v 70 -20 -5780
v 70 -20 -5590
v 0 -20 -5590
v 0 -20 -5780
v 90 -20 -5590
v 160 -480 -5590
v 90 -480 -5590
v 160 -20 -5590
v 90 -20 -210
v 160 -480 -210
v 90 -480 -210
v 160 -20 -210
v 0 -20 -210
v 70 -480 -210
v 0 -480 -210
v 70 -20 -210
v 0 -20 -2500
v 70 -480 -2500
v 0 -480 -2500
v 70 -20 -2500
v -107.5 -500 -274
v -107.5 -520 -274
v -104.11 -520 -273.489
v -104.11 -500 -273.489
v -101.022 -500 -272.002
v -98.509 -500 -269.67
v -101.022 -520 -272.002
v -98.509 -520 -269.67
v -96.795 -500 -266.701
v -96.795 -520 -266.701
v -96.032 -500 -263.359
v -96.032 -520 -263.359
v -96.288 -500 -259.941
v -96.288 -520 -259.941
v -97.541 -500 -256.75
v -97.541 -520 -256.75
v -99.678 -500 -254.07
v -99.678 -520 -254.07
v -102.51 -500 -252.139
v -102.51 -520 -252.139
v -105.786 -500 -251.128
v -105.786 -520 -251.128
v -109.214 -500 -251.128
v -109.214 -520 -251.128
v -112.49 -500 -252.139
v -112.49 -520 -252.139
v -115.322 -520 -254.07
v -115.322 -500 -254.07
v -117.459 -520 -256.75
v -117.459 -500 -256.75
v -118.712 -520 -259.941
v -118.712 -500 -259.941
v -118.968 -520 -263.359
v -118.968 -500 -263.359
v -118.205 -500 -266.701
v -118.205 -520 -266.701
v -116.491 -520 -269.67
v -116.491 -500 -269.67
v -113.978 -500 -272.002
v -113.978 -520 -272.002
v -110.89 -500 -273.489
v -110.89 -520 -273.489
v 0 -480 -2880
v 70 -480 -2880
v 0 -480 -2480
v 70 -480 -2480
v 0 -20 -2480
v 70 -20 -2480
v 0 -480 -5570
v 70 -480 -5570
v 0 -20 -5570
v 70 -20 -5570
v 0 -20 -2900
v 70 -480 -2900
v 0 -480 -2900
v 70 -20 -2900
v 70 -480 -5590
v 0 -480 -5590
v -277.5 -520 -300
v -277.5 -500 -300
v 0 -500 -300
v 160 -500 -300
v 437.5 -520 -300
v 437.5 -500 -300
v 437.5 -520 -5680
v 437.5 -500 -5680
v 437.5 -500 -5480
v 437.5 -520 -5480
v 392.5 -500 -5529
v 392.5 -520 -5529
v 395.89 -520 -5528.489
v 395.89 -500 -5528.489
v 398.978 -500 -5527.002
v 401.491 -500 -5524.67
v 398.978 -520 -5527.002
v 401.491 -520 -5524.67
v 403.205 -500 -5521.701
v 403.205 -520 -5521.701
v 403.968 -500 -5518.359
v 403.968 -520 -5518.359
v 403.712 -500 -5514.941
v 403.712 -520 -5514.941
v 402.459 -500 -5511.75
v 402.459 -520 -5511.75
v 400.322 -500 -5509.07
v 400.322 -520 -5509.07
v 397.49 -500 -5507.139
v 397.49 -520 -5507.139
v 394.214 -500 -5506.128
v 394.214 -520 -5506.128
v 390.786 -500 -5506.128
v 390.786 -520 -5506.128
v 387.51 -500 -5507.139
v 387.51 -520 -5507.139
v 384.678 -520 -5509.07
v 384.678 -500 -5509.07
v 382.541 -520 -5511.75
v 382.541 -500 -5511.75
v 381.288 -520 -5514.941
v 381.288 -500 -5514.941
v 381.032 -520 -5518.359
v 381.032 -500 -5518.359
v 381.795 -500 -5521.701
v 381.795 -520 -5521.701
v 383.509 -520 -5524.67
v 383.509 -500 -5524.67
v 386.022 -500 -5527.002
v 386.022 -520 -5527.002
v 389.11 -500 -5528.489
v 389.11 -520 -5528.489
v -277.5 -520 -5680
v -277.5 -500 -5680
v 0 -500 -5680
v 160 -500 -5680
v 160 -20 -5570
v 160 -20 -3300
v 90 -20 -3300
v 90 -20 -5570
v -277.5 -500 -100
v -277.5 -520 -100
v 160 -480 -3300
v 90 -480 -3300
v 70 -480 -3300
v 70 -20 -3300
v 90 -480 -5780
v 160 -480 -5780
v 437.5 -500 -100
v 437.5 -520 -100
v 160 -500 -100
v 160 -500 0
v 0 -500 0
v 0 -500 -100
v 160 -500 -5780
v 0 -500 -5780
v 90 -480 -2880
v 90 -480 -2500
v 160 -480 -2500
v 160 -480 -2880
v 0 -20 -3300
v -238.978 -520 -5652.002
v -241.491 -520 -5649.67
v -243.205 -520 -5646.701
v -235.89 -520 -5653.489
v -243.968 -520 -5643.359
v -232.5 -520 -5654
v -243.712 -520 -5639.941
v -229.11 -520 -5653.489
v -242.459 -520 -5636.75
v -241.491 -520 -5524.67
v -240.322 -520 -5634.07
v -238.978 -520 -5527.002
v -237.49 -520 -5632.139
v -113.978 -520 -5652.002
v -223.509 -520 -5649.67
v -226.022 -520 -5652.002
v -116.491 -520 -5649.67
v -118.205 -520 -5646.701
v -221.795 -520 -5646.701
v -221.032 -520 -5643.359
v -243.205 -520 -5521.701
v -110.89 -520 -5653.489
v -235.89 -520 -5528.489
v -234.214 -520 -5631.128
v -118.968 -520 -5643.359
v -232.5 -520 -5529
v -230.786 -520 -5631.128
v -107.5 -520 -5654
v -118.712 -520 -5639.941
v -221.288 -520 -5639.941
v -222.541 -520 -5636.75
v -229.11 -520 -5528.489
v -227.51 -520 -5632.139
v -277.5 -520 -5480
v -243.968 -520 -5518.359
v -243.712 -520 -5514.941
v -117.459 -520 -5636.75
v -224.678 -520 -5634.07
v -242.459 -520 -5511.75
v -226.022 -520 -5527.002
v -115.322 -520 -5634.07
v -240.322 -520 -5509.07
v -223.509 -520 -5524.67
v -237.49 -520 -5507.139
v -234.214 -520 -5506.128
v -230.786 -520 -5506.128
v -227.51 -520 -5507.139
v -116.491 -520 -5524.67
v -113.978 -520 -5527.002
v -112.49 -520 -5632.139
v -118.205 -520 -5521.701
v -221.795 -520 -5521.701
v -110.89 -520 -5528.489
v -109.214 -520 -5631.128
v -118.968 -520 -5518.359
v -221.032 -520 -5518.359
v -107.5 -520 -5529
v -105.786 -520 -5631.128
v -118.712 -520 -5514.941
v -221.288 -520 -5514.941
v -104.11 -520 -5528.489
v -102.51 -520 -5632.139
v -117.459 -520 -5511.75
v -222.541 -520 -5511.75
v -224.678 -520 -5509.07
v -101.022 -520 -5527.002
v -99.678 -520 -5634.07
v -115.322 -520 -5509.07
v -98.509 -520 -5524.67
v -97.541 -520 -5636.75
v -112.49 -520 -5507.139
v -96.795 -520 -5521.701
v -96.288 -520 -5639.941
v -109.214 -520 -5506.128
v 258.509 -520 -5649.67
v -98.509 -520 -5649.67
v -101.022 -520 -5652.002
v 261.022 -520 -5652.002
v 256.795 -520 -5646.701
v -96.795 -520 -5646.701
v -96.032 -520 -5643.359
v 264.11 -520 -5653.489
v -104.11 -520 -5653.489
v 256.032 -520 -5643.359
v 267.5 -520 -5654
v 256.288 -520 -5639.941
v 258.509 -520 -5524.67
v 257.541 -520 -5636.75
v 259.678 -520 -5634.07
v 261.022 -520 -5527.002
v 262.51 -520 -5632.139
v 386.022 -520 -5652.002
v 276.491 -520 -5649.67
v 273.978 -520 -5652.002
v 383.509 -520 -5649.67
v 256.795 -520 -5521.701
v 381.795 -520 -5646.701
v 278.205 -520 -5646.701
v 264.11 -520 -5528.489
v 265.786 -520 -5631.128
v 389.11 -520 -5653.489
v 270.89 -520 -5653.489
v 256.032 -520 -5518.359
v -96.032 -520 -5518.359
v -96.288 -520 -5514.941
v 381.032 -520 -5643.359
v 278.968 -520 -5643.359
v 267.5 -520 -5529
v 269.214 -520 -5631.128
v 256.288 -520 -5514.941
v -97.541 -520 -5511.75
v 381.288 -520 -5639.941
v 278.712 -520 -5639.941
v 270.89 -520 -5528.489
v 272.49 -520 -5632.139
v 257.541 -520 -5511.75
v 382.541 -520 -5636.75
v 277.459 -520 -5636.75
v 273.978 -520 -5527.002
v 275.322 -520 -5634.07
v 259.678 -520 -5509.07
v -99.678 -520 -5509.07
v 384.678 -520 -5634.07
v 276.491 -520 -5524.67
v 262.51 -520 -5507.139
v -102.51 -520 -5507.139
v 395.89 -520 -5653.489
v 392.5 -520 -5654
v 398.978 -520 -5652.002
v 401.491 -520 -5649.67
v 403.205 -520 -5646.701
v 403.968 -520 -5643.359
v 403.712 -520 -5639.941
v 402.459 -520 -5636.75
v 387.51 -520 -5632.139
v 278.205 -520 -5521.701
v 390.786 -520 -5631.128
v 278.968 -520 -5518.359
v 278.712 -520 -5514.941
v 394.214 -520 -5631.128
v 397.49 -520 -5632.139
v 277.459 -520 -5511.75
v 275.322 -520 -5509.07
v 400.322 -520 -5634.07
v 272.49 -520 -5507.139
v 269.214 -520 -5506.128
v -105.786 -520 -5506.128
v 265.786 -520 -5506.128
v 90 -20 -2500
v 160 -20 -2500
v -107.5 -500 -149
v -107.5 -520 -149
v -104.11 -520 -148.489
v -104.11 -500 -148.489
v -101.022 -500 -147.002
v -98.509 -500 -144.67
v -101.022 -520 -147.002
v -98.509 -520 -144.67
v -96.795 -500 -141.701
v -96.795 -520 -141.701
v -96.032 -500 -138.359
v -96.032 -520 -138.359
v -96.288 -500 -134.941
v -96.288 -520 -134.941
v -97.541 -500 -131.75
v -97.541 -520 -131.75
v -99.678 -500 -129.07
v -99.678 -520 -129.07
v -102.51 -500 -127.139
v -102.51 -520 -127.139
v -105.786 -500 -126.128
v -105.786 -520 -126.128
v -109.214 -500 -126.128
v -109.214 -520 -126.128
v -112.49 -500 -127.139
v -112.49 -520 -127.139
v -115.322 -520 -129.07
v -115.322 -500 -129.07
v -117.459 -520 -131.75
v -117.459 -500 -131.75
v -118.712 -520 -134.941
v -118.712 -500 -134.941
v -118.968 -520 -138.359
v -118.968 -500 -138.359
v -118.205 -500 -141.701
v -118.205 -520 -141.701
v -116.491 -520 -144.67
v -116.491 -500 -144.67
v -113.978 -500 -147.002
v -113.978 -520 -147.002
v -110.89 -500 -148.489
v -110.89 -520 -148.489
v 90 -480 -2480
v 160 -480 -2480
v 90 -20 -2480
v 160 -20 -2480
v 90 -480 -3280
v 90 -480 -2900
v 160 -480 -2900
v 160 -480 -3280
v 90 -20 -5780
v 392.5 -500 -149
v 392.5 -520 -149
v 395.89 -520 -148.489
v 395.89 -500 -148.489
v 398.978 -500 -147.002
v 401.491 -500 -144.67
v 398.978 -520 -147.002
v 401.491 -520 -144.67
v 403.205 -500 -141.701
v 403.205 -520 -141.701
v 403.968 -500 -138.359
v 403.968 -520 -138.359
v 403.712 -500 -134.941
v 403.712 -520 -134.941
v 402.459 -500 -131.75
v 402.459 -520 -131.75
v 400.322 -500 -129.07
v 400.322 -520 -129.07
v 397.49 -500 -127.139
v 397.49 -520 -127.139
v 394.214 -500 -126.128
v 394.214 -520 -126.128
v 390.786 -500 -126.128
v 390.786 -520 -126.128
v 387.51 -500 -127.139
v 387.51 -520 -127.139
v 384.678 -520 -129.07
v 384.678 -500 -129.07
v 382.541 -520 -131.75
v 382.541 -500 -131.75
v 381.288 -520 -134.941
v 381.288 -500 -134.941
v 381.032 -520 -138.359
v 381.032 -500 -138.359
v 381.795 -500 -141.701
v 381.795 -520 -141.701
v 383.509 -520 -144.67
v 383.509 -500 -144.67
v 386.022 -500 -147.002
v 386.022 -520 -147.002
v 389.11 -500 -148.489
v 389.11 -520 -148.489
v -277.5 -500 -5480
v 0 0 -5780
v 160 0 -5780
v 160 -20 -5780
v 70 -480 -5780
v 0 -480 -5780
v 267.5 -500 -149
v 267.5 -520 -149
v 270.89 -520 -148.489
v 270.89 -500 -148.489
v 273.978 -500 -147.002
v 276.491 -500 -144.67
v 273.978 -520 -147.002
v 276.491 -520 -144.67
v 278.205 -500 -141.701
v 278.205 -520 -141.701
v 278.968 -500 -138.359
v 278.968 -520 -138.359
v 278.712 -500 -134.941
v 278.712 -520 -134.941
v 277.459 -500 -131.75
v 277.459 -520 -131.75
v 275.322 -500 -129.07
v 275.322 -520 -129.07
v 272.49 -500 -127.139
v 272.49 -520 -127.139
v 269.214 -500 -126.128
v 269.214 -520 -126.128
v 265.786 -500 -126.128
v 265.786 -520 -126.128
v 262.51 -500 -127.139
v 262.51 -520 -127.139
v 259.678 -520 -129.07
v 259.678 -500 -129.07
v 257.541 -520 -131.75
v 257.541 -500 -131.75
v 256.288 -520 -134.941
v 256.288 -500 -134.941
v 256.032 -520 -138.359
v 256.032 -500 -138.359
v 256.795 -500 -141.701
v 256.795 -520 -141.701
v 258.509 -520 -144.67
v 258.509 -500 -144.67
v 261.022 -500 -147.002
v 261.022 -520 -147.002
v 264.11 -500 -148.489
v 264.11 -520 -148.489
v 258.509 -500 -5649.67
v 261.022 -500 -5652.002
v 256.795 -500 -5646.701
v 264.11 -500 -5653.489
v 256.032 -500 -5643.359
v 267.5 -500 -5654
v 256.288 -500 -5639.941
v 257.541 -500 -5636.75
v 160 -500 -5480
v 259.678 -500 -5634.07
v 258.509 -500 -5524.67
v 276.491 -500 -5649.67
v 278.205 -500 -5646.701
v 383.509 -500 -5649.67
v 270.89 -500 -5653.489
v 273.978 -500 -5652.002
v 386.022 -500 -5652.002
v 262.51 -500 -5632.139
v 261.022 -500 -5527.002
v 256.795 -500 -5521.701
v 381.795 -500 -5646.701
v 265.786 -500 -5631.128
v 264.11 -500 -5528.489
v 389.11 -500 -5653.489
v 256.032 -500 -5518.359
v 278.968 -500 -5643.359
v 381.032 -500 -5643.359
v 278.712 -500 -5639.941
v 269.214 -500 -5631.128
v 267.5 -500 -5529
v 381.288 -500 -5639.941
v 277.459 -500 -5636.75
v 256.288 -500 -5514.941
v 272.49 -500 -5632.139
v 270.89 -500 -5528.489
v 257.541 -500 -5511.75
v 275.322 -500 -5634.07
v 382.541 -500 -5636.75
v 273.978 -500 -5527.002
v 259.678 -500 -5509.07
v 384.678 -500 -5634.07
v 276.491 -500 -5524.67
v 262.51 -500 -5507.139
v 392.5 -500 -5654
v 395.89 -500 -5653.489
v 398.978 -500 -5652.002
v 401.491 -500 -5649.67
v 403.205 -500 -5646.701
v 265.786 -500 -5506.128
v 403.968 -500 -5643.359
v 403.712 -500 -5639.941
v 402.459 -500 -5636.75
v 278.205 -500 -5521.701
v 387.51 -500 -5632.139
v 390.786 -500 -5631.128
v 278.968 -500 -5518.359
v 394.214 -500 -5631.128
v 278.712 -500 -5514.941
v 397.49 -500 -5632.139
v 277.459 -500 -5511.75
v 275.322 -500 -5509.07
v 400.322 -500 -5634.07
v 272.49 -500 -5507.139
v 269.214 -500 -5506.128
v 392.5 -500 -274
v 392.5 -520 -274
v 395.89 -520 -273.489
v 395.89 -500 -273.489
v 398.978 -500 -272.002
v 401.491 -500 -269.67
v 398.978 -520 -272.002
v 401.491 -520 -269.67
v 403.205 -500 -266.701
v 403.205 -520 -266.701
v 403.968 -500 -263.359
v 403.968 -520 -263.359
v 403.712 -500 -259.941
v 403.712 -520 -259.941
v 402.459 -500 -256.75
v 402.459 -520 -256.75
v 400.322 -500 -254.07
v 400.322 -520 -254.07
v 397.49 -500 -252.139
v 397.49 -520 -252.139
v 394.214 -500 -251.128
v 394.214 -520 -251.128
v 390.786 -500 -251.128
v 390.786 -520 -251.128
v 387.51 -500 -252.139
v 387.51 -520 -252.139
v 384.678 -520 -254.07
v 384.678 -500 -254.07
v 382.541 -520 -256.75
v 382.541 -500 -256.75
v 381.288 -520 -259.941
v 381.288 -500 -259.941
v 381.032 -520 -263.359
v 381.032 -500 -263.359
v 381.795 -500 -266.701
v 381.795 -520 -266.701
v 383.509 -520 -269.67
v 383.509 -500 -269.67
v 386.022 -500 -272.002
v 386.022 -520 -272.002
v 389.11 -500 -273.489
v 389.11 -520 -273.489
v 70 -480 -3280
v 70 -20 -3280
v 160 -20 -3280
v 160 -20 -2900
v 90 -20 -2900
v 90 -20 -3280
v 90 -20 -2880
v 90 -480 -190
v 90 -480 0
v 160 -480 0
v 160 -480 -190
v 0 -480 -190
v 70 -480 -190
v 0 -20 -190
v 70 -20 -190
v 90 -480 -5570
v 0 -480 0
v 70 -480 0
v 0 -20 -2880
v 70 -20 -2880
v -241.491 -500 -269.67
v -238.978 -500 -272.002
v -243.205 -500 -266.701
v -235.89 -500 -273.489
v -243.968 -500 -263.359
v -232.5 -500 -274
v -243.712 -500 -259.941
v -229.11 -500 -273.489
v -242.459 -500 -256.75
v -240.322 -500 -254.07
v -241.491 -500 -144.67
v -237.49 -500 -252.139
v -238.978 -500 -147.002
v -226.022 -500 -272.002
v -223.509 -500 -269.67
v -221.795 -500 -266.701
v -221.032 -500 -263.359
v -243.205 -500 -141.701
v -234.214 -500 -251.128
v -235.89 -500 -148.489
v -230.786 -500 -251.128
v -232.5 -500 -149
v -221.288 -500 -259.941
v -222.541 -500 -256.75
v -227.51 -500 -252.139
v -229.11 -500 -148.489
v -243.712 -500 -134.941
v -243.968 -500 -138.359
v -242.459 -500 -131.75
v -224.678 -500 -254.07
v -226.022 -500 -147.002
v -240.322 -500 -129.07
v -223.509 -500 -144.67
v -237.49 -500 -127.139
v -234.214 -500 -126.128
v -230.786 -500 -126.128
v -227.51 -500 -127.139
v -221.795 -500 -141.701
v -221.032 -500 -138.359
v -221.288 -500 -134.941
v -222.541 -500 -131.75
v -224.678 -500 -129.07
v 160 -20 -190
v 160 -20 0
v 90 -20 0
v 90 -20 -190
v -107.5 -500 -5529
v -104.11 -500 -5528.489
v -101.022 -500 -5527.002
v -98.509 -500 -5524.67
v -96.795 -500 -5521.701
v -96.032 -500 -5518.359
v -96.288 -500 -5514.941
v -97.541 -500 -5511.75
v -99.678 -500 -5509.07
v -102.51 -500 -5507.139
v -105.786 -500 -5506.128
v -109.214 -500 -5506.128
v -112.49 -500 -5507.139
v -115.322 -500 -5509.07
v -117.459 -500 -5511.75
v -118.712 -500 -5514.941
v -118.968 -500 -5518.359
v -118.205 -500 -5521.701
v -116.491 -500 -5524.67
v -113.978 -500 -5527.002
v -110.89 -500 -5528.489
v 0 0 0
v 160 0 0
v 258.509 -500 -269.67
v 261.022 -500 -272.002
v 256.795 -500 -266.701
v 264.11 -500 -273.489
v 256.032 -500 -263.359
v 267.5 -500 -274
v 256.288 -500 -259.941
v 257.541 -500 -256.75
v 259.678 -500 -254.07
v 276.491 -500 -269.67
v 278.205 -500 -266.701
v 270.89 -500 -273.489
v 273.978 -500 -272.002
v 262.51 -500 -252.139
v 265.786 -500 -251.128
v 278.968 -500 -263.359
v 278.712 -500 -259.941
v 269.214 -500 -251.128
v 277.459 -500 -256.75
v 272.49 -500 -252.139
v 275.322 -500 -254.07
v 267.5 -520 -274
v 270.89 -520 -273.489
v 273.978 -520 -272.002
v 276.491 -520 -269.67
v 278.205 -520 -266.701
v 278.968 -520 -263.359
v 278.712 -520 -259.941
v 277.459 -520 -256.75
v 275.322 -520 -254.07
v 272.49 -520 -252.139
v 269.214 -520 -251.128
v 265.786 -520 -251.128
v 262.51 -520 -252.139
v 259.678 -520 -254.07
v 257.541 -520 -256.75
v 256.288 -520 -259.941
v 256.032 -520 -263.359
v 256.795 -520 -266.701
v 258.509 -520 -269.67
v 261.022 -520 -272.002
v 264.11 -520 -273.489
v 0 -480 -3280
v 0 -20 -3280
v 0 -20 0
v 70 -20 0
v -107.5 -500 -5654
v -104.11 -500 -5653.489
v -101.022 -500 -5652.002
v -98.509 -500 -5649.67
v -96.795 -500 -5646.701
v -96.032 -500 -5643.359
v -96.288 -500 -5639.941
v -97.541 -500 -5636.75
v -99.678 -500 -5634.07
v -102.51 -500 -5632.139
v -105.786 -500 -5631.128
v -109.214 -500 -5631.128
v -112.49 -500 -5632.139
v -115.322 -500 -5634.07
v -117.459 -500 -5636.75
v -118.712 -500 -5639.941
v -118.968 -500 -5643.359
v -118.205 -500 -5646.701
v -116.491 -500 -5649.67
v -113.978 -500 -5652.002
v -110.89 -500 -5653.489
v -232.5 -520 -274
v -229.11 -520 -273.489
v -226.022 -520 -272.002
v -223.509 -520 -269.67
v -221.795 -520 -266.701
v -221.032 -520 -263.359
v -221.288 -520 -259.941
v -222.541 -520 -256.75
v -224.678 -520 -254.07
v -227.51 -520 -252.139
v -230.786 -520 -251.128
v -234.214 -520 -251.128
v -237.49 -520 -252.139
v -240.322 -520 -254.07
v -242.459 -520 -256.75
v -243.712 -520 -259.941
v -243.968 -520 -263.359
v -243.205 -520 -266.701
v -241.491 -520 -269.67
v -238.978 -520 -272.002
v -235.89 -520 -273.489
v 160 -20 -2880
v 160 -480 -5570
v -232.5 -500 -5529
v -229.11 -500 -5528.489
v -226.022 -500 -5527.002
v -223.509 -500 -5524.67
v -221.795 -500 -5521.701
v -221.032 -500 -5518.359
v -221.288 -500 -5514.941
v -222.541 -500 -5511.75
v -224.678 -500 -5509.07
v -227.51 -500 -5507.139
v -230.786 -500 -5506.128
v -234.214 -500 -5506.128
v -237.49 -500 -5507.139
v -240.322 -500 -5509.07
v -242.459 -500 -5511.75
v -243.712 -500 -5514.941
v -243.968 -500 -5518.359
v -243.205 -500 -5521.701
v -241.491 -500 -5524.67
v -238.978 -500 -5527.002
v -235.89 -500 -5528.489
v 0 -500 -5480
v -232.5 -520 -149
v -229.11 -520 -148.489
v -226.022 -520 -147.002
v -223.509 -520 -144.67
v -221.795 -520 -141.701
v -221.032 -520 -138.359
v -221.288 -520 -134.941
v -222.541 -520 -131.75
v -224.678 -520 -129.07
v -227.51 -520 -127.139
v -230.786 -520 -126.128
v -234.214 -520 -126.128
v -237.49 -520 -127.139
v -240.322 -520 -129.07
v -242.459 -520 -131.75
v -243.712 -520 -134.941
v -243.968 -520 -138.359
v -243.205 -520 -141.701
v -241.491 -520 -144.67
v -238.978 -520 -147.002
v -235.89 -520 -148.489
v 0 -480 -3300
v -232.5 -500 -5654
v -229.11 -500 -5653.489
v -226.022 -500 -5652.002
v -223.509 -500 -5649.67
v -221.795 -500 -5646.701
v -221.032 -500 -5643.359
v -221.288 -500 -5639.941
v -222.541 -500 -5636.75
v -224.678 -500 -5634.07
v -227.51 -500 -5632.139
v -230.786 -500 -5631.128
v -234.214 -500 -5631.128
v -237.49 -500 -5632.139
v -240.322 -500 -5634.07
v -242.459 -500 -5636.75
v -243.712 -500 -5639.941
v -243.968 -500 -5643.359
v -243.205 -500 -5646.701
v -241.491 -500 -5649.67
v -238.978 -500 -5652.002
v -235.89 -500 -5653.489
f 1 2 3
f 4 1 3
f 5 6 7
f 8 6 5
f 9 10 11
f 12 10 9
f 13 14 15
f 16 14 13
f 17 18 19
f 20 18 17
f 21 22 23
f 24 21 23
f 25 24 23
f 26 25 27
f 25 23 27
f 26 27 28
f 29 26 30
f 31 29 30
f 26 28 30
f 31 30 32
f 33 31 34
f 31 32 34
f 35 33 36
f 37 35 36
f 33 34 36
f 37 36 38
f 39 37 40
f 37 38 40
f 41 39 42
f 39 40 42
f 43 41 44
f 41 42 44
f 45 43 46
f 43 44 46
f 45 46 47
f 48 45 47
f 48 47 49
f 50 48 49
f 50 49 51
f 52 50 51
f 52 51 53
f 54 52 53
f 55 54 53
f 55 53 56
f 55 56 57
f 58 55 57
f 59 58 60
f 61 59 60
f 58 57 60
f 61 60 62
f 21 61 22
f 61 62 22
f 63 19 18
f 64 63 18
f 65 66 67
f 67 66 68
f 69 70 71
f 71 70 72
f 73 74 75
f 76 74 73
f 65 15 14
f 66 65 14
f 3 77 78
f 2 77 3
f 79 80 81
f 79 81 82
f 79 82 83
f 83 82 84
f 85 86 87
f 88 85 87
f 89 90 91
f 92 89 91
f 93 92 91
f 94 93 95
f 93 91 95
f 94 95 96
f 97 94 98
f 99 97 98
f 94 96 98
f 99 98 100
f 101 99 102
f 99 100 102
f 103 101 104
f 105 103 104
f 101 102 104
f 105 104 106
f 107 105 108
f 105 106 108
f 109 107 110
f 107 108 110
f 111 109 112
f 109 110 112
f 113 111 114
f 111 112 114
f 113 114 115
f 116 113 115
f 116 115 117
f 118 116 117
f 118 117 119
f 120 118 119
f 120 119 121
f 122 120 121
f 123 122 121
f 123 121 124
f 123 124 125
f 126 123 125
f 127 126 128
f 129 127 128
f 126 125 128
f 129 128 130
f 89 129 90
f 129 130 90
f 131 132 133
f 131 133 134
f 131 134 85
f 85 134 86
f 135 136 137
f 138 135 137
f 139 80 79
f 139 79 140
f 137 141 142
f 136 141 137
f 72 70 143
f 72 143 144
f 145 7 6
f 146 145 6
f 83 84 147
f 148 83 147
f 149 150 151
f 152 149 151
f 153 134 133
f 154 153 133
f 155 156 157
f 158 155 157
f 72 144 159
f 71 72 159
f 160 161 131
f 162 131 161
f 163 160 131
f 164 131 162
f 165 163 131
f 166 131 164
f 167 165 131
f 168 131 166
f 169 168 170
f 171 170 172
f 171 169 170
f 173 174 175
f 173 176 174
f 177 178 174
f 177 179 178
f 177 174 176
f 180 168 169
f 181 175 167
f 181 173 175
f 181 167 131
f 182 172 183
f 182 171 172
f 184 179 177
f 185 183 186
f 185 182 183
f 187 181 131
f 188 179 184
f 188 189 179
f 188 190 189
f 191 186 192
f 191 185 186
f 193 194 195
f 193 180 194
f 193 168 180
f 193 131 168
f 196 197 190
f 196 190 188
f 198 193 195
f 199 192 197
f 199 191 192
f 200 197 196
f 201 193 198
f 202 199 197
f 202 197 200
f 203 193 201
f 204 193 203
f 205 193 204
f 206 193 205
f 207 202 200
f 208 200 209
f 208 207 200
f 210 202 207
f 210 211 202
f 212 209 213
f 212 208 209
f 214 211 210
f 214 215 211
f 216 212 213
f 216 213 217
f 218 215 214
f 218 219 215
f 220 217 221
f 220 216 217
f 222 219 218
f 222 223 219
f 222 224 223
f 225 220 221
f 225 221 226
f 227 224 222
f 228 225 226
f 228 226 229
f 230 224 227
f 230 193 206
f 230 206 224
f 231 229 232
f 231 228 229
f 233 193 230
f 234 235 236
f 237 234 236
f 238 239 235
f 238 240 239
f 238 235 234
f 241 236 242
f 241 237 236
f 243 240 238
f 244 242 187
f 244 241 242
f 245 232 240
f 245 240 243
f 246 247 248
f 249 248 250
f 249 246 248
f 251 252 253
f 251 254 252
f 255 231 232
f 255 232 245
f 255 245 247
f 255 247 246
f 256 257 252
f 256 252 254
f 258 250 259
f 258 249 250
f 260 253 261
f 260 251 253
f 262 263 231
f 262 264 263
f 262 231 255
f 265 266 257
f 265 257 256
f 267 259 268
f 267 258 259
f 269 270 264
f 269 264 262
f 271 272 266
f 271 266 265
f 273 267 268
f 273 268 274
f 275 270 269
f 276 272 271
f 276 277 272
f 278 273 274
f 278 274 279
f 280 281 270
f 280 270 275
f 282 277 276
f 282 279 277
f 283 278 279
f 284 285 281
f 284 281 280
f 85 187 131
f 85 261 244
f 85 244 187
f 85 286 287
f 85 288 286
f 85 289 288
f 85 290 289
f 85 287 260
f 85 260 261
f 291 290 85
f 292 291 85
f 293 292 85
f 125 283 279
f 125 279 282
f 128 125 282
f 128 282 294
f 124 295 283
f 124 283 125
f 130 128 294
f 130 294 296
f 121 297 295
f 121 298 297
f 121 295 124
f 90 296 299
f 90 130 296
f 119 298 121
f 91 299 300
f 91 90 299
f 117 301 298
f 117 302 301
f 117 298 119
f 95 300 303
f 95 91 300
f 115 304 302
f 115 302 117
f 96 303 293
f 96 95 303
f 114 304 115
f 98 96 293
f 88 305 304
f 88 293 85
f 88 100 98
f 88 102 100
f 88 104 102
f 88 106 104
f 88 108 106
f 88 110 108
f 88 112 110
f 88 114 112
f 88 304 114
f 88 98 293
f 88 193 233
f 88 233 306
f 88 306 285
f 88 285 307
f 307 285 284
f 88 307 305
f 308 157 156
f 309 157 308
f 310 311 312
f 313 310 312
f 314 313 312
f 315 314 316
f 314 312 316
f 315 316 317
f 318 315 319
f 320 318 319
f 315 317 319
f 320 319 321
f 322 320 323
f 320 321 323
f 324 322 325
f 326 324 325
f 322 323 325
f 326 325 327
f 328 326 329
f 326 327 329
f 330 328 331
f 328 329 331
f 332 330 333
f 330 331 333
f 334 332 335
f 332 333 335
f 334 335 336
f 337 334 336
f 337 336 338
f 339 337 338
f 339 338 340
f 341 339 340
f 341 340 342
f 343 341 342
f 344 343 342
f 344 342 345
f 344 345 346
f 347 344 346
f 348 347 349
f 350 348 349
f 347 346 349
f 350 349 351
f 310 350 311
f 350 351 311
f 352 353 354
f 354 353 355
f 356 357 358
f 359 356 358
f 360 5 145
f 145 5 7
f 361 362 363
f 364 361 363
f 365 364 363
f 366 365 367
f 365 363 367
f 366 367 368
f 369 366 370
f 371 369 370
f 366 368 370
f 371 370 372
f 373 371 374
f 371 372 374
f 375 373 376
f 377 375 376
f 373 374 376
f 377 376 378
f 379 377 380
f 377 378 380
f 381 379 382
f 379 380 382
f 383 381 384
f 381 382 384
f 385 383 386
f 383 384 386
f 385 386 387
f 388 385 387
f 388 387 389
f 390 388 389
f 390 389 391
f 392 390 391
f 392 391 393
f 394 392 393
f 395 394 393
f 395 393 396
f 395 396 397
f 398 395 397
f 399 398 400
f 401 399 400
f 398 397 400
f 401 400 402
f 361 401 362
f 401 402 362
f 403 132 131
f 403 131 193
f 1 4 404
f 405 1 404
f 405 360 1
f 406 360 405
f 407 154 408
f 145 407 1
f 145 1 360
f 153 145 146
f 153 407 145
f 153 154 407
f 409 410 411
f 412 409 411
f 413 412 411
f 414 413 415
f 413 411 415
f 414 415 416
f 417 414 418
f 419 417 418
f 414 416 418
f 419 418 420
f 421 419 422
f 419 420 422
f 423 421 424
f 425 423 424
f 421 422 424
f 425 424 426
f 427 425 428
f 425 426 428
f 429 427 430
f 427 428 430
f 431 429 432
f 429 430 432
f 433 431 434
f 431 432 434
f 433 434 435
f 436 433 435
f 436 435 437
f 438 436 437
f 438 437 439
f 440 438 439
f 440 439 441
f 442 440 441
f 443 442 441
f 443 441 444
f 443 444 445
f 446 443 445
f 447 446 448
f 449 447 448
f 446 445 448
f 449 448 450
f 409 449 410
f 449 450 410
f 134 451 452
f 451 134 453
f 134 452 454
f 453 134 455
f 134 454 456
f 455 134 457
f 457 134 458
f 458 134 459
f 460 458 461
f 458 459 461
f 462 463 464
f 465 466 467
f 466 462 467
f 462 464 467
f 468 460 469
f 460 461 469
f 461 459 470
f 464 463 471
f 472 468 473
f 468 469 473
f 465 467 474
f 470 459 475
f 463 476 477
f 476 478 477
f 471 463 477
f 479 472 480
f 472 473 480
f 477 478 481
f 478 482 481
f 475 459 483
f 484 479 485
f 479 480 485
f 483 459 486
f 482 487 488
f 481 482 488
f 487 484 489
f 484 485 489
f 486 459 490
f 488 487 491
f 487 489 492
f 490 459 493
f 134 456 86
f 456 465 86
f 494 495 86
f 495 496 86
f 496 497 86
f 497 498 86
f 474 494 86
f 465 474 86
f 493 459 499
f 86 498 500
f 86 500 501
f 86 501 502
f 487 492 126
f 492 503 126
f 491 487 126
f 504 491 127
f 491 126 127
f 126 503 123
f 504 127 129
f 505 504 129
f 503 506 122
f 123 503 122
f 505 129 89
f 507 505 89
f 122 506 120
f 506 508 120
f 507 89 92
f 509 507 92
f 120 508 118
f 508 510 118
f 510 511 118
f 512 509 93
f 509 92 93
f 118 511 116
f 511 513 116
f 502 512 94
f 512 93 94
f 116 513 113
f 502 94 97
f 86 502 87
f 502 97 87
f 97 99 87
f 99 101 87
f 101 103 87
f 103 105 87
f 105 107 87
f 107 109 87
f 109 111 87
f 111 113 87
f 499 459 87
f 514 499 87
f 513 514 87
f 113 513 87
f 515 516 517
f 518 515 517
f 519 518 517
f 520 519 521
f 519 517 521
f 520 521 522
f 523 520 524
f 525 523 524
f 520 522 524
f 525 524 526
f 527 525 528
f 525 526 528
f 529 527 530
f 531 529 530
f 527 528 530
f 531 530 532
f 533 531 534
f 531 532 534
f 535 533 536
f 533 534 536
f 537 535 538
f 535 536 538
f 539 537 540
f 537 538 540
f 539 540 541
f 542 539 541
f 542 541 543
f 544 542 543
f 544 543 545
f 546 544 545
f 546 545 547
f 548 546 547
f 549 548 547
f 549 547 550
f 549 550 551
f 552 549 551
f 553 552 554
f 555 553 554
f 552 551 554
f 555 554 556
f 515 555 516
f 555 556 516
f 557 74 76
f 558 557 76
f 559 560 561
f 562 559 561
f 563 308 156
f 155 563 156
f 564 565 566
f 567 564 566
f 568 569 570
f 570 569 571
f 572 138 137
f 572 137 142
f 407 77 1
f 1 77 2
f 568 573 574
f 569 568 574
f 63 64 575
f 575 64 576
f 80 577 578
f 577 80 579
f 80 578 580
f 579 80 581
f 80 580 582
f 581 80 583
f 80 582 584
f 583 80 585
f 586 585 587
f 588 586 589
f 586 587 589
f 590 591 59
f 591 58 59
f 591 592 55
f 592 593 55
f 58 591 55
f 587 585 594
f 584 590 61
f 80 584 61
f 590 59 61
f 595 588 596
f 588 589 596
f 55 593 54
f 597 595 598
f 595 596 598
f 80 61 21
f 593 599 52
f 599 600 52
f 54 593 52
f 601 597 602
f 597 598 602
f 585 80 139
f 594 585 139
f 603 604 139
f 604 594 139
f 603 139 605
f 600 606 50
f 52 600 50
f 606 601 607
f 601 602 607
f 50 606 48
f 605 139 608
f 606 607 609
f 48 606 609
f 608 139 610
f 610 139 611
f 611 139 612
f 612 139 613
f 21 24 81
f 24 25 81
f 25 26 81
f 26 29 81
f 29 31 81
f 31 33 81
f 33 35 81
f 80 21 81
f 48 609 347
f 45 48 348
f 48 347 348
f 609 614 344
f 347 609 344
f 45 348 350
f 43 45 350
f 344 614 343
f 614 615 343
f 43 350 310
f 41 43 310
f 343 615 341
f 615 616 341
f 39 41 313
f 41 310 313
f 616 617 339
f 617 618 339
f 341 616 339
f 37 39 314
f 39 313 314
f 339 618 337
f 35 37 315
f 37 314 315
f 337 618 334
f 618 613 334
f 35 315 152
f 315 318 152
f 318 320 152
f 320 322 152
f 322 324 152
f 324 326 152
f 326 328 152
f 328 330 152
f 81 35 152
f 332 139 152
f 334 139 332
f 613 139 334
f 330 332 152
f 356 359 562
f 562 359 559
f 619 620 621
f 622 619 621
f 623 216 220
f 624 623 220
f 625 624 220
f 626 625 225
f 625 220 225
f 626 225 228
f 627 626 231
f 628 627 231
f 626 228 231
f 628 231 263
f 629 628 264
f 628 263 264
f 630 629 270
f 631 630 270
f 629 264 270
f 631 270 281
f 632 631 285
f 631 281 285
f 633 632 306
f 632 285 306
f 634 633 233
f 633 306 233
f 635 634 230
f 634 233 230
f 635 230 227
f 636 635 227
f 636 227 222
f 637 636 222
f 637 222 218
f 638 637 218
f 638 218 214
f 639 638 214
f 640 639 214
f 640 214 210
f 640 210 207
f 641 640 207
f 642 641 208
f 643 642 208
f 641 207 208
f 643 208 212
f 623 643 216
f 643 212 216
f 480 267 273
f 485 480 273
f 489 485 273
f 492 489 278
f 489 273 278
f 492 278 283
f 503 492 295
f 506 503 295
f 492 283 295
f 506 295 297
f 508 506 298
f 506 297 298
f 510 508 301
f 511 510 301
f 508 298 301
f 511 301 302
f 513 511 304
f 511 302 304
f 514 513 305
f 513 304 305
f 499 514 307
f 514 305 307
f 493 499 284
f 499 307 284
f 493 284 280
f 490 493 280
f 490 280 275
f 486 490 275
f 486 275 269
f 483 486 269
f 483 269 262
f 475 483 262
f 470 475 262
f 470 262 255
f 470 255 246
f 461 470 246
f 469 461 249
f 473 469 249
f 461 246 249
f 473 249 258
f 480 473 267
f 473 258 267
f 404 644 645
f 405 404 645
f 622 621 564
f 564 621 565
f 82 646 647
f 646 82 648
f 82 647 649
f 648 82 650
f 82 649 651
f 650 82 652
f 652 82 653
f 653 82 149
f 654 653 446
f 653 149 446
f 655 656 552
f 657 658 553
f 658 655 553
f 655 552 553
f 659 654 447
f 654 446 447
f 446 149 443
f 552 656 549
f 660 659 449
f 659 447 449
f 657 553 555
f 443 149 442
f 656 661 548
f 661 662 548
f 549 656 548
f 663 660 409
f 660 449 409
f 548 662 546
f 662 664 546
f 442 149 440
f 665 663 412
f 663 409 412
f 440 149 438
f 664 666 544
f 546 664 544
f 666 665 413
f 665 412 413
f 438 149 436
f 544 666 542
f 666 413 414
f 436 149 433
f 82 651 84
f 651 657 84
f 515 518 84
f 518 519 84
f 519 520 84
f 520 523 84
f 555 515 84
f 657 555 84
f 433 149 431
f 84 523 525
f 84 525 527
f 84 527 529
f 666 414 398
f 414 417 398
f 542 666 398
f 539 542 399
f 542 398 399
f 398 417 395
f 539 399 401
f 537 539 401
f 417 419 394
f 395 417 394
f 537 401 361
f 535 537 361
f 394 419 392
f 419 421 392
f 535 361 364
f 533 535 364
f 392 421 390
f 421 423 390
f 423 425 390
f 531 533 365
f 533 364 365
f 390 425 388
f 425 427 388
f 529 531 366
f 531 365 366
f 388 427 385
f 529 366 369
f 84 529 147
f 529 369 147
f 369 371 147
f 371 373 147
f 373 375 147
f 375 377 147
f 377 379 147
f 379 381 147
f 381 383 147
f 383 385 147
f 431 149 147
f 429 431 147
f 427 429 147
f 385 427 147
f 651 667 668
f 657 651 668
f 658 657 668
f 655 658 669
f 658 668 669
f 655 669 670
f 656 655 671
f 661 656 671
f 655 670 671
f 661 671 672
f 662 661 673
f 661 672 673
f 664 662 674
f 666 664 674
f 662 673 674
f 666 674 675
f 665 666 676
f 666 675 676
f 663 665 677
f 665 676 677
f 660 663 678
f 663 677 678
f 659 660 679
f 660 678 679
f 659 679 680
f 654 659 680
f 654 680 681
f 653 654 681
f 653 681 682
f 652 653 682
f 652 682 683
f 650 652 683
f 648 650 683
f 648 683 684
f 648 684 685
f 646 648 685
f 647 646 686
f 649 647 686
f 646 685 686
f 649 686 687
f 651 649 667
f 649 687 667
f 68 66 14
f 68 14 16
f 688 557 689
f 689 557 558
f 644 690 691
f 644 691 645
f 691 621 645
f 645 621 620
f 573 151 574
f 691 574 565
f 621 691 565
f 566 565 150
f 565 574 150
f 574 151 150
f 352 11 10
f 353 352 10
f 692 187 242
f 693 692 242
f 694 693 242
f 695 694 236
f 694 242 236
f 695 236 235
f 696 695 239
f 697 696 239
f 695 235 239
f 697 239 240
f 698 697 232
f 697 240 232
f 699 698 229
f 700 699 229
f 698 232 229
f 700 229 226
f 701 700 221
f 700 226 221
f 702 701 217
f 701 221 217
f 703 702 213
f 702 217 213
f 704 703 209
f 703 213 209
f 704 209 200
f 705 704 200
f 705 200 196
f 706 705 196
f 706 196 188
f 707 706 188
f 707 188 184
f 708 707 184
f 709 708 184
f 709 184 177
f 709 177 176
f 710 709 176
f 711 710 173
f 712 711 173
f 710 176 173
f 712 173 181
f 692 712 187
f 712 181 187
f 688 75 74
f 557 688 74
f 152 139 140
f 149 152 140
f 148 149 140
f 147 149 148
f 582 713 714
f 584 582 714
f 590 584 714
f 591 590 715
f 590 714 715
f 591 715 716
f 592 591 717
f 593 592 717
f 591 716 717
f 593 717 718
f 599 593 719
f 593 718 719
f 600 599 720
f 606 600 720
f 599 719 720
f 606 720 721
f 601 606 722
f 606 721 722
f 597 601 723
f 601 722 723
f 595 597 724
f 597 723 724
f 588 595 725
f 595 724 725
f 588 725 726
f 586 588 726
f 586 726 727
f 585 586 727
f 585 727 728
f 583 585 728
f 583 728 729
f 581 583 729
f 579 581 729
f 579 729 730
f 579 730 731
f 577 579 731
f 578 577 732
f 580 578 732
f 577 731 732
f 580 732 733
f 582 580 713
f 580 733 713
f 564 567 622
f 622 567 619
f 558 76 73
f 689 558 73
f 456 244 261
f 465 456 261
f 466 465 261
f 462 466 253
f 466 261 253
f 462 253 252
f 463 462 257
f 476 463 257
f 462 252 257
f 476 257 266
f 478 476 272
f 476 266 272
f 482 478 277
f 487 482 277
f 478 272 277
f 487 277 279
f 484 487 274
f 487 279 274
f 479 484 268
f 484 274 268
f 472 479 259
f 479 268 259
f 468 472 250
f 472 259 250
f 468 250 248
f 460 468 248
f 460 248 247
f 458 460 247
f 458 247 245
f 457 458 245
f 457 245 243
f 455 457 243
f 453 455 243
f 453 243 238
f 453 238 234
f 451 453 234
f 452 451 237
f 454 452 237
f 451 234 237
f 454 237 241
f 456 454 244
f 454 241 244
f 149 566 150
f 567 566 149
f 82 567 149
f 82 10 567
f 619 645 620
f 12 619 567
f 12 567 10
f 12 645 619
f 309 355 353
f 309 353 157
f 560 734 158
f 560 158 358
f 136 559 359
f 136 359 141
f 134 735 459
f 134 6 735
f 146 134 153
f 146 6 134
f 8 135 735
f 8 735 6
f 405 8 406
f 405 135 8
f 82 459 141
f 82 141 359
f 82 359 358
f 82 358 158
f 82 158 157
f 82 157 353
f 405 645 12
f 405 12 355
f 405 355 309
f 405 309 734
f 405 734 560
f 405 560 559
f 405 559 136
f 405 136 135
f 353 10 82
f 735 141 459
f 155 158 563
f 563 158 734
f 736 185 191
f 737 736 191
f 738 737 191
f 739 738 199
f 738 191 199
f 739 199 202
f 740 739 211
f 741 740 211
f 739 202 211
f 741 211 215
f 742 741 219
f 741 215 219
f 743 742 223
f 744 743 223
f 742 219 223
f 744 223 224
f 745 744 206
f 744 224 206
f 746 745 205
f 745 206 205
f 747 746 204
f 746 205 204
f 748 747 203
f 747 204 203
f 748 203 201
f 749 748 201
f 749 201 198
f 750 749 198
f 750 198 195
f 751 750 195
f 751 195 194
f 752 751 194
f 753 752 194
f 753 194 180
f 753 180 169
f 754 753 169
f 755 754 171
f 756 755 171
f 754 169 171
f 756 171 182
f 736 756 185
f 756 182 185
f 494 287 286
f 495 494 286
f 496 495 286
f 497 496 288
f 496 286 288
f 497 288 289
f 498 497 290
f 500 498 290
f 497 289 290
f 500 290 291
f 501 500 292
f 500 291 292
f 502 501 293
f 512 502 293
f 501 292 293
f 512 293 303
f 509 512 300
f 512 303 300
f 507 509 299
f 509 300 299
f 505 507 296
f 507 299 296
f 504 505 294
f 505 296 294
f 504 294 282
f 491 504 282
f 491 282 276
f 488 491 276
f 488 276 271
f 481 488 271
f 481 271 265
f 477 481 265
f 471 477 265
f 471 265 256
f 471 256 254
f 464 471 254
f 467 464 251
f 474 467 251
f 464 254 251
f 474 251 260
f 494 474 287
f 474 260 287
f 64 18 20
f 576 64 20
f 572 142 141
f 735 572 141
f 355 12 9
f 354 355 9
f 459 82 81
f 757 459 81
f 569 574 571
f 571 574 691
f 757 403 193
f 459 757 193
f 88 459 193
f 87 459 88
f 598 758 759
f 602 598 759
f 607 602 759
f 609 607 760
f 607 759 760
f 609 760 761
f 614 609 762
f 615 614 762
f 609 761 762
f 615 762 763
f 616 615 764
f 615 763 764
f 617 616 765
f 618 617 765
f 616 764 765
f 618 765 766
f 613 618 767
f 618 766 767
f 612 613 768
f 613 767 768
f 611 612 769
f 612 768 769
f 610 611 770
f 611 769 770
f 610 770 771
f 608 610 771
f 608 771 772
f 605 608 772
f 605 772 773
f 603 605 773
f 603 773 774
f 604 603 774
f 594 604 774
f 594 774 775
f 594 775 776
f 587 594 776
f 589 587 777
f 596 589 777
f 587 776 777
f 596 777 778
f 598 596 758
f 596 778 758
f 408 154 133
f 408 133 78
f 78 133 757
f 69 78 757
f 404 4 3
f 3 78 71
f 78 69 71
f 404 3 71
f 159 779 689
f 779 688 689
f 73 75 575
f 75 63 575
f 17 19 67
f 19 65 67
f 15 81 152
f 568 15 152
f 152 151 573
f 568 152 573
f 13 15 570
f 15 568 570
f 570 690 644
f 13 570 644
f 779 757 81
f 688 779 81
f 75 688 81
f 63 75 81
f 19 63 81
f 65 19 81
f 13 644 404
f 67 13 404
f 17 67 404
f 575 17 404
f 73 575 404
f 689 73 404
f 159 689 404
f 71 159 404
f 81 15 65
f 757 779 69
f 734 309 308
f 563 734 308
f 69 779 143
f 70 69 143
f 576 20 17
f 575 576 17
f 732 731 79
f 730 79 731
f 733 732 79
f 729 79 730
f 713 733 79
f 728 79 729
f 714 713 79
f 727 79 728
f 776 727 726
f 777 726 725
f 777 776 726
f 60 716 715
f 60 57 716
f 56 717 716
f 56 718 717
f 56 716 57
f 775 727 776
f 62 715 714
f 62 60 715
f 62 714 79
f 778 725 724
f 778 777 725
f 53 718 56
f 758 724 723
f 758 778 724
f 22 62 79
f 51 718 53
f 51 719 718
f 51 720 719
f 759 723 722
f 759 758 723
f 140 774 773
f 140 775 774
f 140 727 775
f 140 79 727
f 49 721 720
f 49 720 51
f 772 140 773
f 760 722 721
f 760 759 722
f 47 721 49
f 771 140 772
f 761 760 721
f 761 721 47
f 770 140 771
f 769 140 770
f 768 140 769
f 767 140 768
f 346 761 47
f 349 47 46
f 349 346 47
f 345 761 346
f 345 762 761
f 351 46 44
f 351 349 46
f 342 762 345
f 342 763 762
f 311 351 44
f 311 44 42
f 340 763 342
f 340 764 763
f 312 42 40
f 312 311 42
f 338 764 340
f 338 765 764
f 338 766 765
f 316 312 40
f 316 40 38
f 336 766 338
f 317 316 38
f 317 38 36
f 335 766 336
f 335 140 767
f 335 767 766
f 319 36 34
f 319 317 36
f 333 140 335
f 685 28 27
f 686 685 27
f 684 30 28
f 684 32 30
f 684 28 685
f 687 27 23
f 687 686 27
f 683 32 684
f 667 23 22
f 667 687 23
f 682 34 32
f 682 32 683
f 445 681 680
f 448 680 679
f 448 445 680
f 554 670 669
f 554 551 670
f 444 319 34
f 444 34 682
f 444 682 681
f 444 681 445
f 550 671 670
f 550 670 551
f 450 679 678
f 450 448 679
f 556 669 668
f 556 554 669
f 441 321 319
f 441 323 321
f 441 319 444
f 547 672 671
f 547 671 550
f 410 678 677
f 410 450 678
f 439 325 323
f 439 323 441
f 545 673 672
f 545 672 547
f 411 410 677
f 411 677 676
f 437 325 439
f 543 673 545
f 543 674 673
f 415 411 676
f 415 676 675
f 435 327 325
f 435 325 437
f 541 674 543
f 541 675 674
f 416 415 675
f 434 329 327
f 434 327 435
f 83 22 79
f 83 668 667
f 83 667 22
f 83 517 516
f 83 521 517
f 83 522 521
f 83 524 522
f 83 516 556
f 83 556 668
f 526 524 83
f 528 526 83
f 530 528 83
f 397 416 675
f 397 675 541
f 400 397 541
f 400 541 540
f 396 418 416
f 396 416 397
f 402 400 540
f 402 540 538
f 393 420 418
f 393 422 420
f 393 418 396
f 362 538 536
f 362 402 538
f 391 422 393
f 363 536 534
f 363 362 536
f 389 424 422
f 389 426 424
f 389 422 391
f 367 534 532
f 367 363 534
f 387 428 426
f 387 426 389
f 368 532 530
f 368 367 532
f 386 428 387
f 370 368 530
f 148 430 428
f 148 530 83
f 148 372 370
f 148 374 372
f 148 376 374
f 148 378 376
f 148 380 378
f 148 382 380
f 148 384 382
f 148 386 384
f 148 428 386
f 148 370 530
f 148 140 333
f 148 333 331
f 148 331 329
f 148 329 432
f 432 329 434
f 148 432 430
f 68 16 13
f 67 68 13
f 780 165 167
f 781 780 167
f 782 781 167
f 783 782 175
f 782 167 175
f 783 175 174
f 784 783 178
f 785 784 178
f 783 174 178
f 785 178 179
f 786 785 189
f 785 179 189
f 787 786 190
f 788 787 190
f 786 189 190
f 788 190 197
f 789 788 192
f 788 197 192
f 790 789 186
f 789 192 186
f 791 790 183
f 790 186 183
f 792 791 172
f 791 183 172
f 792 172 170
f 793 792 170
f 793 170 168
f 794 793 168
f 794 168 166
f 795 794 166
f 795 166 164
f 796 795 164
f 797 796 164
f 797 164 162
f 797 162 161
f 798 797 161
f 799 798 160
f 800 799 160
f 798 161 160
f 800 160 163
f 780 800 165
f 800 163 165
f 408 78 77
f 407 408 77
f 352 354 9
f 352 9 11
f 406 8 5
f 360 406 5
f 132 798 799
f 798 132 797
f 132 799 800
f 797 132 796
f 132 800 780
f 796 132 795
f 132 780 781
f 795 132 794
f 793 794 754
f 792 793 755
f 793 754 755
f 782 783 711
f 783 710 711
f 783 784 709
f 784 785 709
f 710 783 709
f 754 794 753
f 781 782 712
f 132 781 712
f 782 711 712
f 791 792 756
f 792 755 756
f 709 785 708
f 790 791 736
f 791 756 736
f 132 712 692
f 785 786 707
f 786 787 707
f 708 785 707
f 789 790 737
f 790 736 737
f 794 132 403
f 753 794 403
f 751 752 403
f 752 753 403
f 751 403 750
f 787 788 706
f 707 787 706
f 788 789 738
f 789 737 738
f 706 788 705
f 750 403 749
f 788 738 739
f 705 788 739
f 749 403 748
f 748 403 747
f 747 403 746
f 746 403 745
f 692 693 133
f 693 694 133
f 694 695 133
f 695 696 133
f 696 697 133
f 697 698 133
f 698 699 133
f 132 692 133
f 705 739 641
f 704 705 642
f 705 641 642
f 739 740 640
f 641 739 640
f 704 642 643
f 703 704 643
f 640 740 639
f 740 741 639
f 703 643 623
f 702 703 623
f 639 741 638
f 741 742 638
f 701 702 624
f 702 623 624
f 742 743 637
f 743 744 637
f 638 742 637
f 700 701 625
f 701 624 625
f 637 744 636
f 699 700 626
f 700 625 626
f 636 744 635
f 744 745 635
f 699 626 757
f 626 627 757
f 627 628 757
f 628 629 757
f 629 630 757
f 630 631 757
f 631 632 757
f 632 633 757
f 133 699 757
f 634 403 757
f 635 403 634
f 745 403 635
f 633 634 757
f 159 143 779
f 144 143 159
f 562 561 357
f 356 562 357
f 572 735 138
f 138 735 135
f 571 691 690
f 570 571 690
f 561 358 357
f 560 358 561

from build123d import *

# Parameters (mm, degrees)
EXTRUDE_1_DEPTH        = 5780
SKETCH_2_W             = 20
SKETCH_2_H             = 460
EXTRUDE_2_DEPTH        = 160
SKETCH_3_W             = 715
SKETCH_3_H             = 200
EXTRUDE_3_DEPTH        = 20
SKETCH_4_R             = 11.5
CUT_EXTRUDE_1_DEPTH    = 20
PATTERN_LINEAR_1_COUNT = 2
PATTERN_LINEAR_1_PITCH = 5380


with BuildPart() as part:
    # 草图1 → 凸台-拉伸1 (new body)
    with BuildSketch(Plane(origin=(0, 0, 0), x_dir=(1, 0, 0), z_dir=(0, 0, -1))):
        Polygon((0, 0), (160, 0), (160, 20), (90, 20), (90, 480), (160, 480), (160, 500), (0, 500), (0, 480), (70, 480), (70, 20), (0, 20), align=None)
    extrude(amount=EXTRUDE_1_DEPTH)

    # 草图2 → 凸台-拉伸2 (add)
    with BuildSketch(Plane(origin=(160, 0, 0), x_dir=(0, 0, -1), z_dir=(1, 0, 0))):
        with Locations((200, -250)):
            Rectangle(SKETCH_2_W, SKETCH_2_H)
        with Locations((2490, -250)):
            Rectangle(SKETCH_2_W, SKETCH_2_H)
        with Locations((2890, -250)):
            Rectangle(SKETCH_2_W, SKETCH_2_H)
        with Locations((3290, -250)):
            Rectangle(SKETCH_2_W, SKETCH_2_H)
        with Locations((5580, -250)):
            Rectangle(SKETCH_2_W, SKETCH_2_H)
    extrude(amount=-EXTRUDE_2_DEPTH)

    # 草图3 → 凸台-拉伸3 (add)
    with BuildSketch(Plane.XZ.offset(500)):
        with Locations((80, -5580)):
            Rectangle(SKETCH_3_W, SKETCH_3_H)
        with Locations((80, -200)):
            Rectangle(SKETCH_3_W, SKETCH_3_H)
    extrude(amount=EXTRUDE_3_DEPTH)

    # 草图4 → 切除-拉伸1 (cut)
    with BuildSketch(Plane.XZ.offset(520)):
        with Locations(Location((-232.5, -137.5, 0), (0, 0, 270))):
            Circle(SKETCH_4_R)
        with Locations(Location((-232.5, -262.5, 0), (0, 0, 270))):
            Circle(SKETCH_4_R)
        with Locations(Location((-107.5, -137.5, 0), (0, 0, 270))):
            Circle(SKETCH_4_R)
        with Locations(Location((-107.5, -262.5, 0), (0, 0, 270))):
            Circle(SKETCH_4_R)
        with Locations(Location((267.5, -137.5, 0), (0, 0, 270))):
            Circle(SKETCH_4_R)
        with Locations(Location((267.5, -262.5, 0), (0, 0, 270))):
            Circle(SKETCH_4_R)
        with Locations(Location((392.5, -137.5, 0), (0, 0, 270))):
            Circle(SKETCH_4_R)
        with Locations(Location((392.5, -262.5, 0), (0, 0, 270))):
            Circle(SKETCH_4_R)
    cut_extrude_1 = extrude(amount=-CUT_EXTRUDE_1_DEPTH, mode=Mode.SUBTRACT)

    # 阵列(线性)1: 切除-拉伸1 ×2
    with Locations(*[(0, 0, -i * PATTERN_LINEAR_1_PITCH) for i in range(1, PATTERN_LINEAR_1_COUNT)]):
        add(cut_extrude_1, mode=Mode.SUBTRACT)


solid = part.part
